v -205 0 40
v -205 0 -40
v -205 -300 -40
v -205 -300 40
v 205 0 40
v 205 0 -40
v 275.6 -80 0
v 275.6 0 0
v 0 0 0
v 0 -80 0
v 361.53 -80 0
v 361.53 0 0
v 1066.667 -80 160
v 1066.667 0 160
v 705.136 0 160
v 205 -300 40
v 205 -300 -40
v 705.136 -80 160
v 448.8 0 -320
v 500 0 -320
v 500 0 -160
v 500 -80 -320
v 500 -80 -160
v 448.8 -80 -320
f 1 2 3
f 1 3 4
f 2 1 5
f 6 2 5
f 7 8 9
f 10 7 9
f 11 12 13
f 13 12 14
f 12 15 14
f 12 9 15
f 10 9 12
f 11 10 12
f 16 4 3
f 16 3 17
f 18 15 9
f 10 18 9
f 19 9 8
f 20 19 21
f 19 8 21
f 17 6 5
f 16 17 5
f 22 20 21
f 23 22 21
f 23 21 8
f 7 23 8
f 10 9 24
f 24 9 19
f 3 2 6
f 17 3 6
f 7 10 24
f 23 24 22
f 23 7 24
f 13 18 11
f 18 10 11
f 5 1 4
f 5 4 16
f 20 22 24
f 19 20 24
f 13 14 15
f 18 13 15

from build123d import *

# Parameters (mm, degrees)
F1_DEPTH = 80
F3_DEPTH = 80.001
F5_DEPTH = 80
F6_W     = 410
F6_H     = 80
F7_DEPTH = 300


with BuildPart() as f1:
    # F0 (on Front) → F1 (new body)
    with BuildSketch(Plane.XZ):
        Polygon((275.6, 0), (0, 0), (500, -356.506239), (500, -160), align=None)
    extrude(amount=F1_DEPTH)

    # F2 (on face) → F3 (cut, through all)
    with BuildSketch(Plane.XZ.offset(80)):
        Polygon((500, -356.506239), (500, -320), (448.8, -320), align=None)
    extrude(amount=-F3_DEPTH, mode=Mode.SUBTRACT)


with BuildPart() as f5:
    # F4 (on Front) → F5 (new body)
    with BuildSketch(Plane.XZ):
        Polygon((705.136212, 160), (0, 0), (361.530454, 0), (1066.666667, 160), align=None)
    extrude(amount=F5_DEPTH)


with BuildPart() as f7:
    # F6 (on Front) → F7 (new body)
    with BuildSketch(Plane.XZ):
        Rectangle(F6_W, F6_H)
    extrude(amount=F7_DEPTH)


solid = Compound([f1.part, f5.part, f7.part])
